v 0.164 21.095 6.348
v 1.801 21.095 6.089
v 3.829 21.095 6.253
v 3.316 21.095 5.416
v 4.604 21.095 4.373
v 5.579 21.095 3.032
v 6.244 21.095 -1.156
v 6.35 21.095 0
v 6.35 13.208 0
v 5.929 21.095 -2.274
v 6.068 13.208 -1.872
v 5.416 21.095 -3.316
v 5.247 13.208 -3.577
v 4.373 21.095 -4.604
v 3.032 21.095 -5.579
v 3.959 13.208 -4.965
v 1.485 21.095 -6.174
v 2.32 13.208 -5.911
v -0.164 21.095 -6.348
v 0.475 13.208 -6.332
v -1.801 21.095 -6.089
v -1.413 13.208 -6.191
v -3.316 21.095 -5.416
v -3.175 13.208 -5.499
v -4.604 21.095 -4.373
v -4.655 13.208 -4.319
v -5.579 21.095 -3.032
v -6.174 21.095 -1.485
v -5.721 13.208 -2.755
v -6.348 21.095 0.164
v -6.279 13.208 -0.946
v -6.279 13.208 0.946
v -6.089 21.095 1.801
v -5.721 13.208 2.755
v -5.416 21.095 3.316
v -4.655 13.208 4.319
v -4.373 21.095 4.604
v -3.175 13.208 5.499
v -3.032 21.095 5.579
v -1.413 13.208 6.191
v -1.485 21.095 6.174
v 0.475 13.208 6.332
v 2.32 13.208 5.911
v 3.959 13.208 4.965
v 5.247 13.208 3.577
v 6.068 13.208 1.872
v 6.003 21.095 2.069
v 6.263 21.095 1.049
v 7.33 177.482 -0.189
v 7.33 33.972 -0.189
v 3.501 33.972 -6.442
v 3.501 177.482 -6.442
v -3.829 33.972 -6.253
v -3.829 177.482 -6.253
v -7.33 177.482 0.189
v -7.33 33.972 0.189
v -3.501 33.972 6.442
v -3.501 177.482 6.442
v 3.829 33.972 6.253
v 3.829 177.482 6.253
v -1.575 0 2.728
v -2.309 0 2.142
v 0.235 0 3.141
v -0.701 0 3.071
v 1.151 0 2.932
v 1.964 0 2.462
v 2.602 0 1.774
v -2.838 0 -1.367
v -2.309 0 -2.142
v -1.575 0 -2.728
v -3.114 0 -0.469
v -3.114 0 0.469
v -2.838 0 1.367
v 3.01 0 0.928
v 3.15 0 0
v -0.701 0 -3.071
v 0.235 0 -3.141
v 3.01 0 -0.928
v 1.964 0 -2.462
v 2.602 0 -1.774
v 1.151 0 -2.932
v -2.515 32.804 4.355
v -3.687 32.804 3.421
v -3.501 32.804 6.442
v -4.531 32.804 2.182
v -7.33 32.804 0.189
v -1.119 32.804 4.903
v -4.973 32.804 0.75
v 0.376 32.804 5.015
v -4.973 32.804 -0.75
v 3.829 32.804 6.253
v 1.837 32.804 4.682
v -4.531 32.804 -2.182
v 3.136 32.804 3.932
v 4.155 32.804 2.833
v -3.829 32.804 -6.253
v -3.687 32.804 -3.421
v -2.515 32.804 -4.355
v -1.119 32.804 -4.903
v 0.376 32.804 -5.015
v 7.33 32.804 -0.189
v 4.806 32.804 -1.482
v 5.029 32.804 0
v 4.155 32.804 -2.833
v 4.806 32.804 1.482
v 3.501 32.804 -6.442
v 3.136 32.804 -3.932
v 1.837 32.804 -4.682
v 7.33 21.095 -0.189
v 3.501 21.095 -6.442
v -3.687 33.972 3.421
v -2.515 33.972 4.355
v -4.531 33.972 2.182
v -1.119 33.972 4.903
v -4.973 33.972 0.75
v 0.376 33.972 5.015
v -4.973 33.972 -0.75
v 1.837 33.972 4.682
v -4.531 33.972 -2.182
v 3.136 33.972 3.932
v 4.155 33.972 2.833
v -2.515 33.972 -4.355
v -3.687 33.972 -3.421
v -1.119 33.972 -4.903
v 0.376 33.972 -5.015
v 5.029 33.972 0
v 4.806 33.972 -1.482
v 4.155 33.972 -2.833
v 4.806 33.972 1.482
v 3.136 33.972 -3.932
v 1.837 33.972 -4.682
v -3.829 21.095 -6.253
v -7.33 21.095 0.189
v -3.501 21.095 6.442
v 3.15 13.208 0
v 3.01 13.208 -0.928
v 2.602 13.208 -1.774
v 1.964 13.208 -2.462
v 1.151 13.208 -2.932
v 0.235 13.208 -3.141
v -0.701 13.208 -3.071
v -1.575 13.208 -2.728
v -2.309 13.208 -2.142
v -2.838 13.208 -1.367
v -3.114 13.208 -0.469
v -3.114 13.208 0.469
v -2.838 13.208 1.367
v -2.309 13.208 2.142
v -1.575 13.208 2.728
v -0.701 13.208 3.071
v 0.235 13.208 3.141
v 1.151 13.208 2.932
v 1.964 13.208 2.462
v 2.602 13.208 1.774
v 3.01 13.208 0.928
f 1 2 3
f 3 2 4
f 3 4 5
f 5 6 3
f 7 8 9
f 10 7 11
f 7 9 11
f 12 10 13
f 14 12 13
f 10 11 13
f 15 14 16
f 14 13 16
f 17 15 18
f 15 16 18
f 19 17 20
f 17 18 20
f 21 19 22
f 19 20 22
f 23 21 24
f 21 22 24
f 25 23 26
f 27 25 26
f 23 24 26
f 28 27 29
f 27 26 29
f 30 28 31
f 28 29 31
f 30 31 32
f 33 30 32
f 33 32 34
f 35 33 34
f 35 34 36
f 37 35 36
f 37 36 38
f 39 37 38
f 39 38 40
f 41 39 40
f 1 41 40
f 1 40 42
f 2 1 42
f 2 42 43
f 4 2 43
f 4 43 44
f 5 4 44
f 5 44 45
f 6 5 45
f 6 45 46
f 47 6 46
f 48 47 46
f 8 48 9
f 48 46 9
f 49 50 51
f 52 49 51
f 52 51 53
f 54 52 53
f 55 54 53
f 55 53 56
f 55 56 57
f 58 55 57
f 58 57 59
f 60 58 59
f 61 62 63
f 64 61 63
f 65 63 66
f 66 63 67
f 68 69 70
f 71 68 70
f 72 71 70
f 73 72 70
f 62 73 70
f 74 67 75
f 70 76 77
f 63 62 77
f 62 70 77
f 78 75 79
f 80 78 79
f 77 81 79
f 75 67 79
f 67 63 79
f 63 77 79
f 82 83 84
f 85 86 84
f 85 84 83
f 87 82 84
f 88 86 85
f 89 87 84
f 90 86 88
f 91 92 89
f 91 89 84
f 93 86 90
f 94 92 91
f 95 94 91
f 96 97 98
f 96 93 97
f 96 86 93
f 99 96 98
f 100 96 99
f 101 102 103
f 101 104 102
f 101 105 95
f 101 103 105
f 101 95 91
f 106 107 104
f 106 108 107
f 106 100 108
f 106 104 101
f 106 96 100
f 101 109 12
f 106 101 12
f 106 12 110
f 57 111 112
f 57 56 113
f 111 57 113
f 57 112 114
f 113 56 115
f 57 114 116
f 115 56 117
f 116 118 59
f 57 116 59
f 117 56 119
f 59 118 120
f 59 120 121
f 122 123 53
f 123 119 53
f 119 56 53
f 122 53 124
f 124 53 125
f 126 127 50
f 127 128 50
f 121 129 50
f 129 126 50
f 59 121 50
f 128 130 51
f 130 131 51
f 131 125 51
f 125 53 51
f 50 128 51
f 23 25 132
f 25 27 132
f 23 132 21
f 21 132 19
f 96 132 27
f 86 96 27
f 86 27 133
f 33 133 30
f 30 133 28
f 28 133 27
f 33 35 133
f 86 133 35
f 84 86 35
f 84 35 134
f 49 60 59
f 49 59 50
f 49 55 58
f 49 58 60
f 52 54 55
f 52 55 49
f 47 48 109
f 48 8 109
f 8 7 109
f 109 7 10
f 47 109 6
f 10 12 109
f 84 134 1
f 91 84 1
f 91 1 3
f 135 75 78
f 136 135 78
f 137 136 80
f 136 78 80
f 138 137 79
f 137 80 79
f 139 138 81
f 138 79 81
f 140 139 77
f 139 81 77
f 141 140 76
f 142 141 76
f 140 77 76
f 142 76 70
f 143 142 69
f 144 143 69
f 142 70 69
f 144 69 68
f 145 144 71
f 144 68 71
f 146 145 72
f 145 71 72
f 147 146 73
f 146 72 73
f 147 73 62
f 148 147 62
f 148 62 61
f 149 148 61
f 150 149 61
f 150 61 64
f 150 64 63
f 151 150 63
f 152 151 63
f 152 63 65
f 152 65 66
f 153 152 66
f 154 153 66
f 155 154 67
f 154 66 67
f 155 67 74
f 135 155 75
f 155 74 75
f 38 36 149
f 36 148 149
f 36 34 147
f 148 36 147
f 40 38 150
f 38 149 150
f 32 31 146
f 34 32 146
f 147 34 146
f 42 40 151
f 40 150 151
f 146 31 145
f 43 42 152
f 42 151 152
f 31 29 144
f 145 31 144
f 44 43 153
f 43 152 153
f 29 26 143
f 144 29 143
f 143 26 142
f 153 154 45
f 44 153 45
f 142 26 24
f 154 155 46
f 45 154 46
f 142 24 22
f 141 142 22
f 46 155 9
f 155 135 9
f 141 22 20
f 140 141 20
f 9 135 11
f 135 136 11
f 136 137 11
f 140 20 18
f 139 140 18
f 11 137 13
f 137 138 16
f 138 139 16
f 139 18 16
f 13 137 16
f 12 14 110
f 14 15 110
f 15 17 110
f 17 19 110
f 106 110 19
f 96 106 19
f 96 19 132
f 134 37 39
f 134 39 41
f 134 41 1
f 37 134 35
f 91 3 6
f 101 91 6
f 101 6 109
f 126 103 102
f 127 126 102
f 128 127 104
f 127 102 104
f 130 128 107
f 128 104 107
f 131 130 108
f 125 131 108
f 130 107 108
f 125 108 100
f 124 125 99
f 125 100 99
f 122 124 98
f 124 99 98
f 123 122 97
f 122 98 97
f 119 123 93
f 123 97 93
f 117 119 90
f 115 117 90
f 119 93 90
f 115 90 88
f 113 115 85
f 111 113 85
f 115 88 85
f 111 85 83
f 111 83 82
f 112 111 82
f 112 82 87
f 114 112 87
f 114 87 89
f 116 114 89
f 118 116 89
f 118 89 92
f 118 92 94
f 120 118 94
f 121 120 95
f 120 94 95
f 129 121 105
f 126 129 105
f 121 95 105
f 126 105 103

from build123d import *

# Parameters (mm, degrees)
SKETCH1_R           = 3.1496
BOSS_EXTRUDE1_DEPTH = 13.208
SKETCH2_R           = 6.35
BOSS_EXTRUDE2_DEPTH = 7.8867
BOSS_EXTRUDE3_DEPTH = 11.7094
SKETCH4_R           = 5.0292
BOSS_EXTRUDE4_DEPTH = 1.1684
BOSS_EXTRUDE5_DEPTH = 143.51


with BuildPart() as part:
    # Sketch1 → Boss-Extrude1 (new body)
    with BuildSketch(Plane(origin=(0, 0, 0), x_dir=(1, 0, 0), z_dir=(0, 1, 0))):
        Circle(SKETCH1_R)
    extrude(amount=BOSS_EXTRUDE1_DEPTH)

    # Sketch2 → Boss-Extrude2 (add)
    with BuildSketch(Plane(origin=(0, 13.208, 0), x_dir=(1, 0, 0), z_dir=(0, 1, 0))):
        Circle(SKETCH2_R)
    extrude(amount=BOSS_EXTRUDE2_DEPTH)

    # Sketch3 → Boss-Extrude3 (add)
    with BuildSketch(Plane(origin=(0, 21.0947, 0), x_dir=(1, 0, 0), z_dir=(0, 1, 0))):
        Polygon((3.828614027, -6.253402911), (7.329912794, 0.188975553), (3.501298767, 6.442378464), (-3.828614027, 6.253402911), (-7.329912794, -0.188975553), (-3.501298767, -6.442378464), align=None)
    extrude(amount=BOSS_EXTRUDE3_DEPTH)

    # Sketch4 → Boss-Extrude4 (add)
    with BuildSketch(Plane(origin=(0, 32.8041, 0), x_dir=(1, 0, 0), z_dir=(0, 1, 0))):
        Circle(SKETCH4_R)
    extrude(amount=BOSS_EXTRUDE4_DEPTH)

    # Sketch5 → Boss-Extrude5 (add)
    with BuildSketch(Plane(origin=(0, 33.9725, 0), x_dir=(1, 0, 0), z_dir=(0, 1, 0))):
        Polygon((-3.828614027, 6.253402911), (-7.329912794, -0.188975553), (-3.501298767, -6.442378464), (3.828614027, -6.253402911), (7.329912794, 0.188975553), (3.501298767, 6.442378464), align=None)
    extrude(amount=BOSS_EXTRUDE5_DEPTH)


solid = part.part
